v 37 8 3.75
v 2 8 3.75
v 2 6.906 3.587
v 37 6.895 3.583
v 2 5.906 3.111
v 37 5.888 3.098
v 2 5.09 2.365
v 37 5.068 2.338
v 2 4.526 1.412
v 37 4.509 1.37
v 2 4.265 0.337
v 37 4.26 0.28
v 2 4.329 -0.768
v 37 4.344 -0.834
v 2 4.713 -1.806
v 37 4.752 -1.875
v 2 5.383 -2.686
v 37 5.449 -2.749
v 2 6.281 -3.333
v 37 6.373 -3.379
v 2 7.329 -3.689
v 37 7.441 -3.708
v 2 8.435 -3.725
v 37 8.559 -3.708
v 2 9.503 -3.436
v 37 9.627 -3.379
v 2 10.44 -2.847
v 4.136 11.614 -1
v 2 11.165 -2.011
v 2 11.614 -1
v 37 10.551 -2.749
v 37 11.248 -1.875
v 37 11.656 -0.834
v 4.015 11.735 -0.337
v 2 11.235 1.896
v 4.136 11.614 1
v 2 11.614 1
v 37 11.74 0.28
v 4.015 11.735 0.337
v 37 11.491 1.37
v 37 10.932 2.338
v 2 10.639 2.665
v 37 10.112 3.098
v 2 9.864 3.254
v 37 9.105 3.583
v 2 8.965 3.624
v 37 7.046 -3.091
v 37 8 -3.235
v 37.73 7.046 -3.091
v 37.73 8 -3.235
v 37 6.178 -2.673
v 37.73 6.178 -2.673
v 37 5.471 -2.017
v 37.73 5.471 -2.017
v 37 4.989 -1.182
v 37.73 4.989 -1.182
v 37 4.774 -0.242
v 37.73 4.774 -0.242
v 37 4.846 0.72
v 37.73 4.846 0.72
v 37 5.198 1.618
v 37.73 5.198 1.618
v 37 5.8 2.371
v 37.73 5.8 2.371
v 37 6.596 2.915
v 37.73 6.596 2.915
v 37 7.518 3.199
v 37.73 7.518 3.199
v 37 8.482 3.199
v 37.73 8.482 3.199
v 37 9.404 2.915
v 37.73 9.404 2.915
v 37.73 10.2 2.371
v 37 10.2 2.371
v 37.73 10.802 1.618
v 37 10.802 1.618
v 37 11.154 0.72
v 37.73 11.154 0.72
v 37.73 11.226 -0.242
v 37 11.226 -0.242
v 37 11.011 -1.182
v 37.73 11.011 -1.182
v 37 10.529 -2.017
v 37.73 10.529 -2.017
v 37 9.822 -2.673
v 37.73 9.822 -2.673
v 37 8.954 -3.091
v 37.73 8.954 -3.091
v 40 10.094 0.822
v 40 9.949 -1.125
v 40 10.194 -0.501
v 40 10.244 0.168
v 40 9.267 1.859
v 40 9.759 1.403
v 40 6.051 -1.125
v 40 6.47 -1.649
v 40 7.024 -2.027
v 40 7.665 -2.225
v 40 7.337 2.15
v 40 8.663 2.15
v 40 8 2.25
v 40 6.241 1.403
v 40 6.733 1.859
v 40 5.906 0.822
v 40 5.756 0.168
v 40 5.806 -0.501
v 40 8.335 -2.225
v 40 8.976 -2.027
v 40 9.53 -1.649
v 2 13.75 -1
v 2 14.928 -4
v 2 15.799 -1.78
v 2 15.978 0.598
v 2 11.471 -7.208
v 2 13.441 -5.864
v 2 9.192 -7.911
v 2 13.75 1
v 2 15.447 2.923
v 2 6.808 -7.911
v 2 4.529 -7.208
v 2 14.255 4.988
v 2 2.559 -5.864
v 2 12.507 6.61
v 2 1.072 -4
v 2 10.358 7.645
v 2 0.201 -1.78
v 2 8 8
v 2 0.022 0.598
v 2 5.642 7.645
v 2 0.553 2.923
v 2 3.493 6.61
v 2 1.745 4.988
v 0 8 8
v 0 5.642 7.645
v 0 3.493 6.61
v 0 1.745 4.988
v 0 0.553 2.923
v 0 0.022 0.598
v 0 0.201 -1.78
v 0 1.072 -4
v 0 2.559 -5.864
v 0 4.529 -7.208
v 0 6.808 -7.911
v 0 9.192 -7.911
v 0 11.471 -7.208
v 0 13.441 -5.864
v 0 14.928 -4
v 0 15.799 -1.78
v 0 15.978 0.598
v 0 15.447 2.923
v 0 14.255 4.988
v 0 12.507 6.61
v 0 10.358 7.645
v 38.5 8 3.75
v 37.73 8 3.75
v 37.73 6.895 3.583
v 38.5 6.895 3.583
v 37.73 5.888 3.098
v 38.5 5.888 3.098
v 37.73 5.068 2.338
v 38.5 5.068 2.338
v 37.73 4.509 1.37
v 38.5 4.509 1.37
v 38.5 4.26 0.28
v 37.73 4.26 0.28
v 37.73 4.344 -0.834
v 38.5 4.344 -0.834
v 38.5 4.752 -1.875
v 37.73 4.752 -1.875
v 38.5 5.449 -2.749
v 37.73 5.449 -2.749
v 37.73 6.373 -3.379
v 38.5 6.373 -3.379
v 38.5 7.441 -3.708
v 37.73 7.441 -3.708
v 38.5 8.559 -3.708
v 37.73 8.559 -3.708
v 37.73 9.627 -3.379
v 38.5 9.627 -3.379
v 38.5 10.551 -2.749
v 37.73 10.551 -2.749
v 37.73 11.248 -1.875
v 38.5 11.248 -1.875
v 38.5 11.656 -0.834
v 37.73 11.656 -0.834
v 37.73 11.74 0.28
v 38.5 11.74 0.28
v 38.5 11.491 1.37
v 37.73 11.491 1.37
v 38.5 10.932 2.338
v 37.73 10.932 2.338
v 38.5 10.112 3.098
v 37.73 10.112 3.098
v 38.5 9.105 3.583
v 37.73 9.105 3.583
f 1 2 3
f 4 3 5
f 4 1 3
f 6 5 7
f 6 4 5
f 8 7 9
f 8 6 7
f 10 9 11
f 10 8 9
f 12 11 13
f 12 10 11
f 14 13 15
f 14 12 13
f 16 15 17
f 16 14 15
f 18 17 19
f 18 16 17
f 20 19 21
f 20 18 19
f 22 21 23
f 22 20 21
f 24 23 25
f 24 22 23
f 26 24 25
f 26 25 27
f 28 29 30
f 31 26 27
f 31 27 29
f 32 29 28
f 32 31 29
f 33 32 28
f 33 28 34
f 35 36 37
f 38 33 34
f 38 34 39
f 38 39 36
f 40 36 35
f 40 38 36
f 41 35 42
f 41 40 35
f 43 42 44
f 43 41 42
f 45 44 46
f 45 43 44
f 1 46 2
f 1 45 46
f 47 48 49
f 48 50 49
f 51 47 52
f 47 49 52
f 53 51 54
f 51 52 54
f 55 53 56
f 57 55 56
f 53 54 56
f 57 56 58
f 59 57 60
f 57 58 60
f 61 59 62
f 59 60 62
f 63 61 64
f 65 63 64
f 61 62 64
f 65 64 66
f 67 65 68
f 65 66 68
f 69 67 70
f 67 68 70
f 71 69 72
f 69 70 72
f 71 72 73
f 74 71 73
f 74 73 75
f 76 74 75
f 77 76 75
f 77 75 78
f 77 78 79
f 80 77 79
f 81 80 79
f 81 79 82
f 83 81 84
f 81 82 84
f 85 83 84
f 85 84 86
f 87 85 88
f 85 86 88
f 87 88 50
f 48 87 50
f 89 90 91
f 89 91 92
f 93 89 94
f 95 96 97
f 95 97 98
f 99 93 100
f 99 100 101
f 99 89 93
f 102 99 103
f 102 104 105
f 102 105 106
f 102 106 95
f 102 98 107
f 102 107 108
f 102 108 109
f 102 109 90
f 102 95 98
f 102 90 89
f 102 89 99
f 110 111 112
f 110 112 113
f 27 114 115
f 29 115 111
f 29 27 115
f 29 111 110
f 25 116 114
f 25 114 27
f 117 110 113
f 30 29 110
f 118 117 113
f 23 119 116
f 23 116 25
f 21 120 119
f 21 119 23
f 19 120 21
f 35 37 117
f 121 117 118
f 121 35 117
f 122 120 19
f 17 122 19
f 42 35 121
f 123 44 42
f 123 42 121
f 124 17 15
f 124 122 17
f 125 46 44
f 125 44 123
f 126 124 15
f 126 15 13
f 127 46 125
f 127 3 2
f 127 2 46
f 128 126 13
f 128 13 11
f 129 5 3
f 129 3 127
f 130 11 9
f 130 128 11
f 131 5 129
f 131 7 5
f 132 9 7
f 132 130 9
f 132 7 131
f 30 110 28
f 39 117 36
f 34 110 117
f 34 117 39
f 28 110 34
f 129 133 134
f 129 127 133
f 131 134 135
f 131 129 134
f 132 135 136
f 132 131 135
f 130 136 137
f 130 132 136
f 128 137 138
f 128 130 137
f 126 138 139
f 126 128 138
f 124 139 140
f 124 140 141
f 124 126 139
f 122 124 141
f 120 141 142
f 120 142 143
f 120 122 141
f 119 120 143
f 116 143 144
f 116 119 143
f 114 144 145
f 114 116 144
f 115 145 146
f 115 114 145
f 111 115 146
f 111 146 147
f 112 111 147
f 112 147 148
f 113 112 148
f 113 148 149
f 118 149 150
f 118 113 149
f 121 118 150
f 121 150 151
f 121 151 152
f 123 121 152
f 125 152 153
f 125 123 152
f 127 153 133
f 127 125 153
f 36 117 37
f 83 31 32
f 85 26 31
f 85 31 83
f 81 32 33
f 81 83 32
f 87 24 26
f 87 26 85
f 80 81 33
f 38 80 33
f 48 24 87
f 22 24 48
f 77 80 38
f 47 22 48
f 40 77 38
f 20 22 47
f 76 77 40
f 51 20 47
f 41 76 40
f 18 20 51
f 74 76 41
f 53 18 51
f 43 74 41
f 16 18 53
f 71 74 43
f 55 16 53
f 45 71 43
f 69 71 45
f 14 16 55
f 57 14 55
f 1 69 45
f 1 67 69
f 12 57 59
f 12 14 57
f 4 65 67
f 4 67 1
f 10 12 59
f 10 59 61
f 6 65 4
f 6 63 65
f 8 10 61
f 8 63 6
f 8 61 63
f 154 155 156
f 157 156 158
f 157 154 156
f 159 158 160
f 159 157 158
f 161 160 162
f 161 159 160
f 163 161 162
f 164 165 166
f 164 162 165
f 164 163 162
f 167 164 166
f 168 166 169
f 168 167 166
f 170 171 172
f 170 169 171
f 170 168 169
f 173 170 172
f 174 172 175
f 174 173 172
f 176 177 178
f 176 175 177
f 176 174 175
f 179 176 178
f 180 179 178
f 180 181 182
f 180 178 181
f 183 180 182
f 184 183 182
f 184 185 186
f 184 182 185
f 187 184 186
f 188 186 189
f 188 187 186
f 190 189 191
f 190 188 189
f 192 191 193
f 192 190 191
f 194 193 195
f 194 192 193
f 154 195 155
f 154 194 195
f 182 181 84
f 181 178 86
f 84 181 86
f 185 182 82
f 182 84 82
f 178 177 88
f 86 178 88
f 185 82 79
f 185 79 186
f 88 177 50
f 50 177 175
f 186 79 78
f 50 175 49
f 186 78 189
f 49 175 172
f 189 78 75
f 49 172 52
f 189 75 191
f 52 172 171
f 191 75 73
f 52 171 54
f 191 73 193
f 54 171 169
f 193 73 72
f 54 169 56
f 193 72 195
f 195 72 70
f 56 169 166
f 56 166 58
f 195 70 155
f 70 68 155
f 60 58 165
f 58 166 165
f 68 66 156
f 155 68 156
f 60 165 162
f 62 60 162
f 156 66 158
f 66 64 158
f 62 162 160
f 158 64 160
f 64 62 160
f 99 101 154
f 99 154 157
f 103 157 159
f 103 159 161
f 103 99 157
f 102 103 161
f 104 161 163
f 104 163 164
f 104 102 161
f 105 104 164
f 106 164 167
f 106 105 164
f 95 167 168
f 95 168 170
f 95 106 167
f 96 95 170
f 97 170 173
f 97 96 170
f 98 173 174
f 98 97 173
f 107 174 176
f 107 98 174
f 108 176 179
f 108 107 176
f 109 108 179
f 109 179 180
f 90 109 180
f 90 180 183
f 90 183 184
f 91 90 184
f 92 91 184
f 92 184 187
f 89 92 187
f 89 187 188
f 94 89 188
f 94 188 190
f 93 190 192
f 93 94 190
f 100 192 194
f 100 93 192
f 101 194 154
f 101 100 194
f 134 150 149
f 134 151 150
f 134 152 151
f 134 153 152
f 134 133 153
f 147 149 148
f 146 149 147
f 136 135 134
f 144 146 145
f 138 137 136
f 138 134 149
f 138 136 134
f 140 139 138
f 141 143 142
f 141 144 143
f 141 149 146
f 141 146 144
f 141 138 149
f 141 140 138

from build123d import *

# Parameters (mm, degrees)
RIB11_REACH    = 45.818
SKETCH7_WALL_W = 92.464036326
SKETCH7_WALL_H = 2
CHAMFER1_SIZE  = 1.5
SKETCH8_W      = 0.73
SKETCH8_H      = 0.515


with BuildPart() as part:
    # Sketch1 → Revolve1 (revolve)
    with BuildSketch(Plane.XY, mode=Mode.PRIVATE) as revolve1_sk:
        Polygon((0, 0), (2, 0), (2, 4.25), (37, 4.25), (40, 4.25), (40, 8), (0, 8), align=None)
    revolve(revolve1_sk.sketch.rotate(Axis((-10.111111111, 8, 0), (1, 0, 0)), 270), axis=Axis((-10.111111111, 8, 0), (1, 0, 0)))

    # Sketch7 wall → Rib11 (add, up to next)
    with BuildSketch(Plane(origin=(3, 12.75, 0), x_dir=(0.707106781187, -0.707106781187, 0), z_dir=(0.707106781187, 0.707106781187, 0)), mode=Mode.PRIVATE) as rib11_sk1:
        Rectangle(SKETCH7_WALL_W, SKETCH7_WALL_H)
    rib11_tool1 = extrude(rib11_sk1.sketch, amount=-RIB11_REACH, mode=Mode.PRIVATE) - part.part
    add(rib11_tool1.solids().sort_by_distance((3, 12.75, 0))[0])

    # Chamfer1
    chamfer1_edges = [part.edges().sort_by_distance(p)[0] for p in [
        (40, 8, -3.75),
    ]]
    chamfer(chamfer1_edges, length=CHAMFER1_SIZE)

    # Sketch8 → Cut-Revolve1 (revolve, cut)
    with BuildSketch(Plane.XY, mode=Mode.PRIVATE) as cut_revolve1_sk:
        with Locations((37.365, 11.4925)):
            Rectangle(SKETCH8_W, SKETCH8_H)
    revolve(cut_revolve1_sk.sketch.rotate(Axis((40, 8, 0), (-1, 0, 0)), 90), axis=Axis((40, 8, 0), (-1, 0, 0)), mode=Mode.SUBTRACT)


solid = part.part
